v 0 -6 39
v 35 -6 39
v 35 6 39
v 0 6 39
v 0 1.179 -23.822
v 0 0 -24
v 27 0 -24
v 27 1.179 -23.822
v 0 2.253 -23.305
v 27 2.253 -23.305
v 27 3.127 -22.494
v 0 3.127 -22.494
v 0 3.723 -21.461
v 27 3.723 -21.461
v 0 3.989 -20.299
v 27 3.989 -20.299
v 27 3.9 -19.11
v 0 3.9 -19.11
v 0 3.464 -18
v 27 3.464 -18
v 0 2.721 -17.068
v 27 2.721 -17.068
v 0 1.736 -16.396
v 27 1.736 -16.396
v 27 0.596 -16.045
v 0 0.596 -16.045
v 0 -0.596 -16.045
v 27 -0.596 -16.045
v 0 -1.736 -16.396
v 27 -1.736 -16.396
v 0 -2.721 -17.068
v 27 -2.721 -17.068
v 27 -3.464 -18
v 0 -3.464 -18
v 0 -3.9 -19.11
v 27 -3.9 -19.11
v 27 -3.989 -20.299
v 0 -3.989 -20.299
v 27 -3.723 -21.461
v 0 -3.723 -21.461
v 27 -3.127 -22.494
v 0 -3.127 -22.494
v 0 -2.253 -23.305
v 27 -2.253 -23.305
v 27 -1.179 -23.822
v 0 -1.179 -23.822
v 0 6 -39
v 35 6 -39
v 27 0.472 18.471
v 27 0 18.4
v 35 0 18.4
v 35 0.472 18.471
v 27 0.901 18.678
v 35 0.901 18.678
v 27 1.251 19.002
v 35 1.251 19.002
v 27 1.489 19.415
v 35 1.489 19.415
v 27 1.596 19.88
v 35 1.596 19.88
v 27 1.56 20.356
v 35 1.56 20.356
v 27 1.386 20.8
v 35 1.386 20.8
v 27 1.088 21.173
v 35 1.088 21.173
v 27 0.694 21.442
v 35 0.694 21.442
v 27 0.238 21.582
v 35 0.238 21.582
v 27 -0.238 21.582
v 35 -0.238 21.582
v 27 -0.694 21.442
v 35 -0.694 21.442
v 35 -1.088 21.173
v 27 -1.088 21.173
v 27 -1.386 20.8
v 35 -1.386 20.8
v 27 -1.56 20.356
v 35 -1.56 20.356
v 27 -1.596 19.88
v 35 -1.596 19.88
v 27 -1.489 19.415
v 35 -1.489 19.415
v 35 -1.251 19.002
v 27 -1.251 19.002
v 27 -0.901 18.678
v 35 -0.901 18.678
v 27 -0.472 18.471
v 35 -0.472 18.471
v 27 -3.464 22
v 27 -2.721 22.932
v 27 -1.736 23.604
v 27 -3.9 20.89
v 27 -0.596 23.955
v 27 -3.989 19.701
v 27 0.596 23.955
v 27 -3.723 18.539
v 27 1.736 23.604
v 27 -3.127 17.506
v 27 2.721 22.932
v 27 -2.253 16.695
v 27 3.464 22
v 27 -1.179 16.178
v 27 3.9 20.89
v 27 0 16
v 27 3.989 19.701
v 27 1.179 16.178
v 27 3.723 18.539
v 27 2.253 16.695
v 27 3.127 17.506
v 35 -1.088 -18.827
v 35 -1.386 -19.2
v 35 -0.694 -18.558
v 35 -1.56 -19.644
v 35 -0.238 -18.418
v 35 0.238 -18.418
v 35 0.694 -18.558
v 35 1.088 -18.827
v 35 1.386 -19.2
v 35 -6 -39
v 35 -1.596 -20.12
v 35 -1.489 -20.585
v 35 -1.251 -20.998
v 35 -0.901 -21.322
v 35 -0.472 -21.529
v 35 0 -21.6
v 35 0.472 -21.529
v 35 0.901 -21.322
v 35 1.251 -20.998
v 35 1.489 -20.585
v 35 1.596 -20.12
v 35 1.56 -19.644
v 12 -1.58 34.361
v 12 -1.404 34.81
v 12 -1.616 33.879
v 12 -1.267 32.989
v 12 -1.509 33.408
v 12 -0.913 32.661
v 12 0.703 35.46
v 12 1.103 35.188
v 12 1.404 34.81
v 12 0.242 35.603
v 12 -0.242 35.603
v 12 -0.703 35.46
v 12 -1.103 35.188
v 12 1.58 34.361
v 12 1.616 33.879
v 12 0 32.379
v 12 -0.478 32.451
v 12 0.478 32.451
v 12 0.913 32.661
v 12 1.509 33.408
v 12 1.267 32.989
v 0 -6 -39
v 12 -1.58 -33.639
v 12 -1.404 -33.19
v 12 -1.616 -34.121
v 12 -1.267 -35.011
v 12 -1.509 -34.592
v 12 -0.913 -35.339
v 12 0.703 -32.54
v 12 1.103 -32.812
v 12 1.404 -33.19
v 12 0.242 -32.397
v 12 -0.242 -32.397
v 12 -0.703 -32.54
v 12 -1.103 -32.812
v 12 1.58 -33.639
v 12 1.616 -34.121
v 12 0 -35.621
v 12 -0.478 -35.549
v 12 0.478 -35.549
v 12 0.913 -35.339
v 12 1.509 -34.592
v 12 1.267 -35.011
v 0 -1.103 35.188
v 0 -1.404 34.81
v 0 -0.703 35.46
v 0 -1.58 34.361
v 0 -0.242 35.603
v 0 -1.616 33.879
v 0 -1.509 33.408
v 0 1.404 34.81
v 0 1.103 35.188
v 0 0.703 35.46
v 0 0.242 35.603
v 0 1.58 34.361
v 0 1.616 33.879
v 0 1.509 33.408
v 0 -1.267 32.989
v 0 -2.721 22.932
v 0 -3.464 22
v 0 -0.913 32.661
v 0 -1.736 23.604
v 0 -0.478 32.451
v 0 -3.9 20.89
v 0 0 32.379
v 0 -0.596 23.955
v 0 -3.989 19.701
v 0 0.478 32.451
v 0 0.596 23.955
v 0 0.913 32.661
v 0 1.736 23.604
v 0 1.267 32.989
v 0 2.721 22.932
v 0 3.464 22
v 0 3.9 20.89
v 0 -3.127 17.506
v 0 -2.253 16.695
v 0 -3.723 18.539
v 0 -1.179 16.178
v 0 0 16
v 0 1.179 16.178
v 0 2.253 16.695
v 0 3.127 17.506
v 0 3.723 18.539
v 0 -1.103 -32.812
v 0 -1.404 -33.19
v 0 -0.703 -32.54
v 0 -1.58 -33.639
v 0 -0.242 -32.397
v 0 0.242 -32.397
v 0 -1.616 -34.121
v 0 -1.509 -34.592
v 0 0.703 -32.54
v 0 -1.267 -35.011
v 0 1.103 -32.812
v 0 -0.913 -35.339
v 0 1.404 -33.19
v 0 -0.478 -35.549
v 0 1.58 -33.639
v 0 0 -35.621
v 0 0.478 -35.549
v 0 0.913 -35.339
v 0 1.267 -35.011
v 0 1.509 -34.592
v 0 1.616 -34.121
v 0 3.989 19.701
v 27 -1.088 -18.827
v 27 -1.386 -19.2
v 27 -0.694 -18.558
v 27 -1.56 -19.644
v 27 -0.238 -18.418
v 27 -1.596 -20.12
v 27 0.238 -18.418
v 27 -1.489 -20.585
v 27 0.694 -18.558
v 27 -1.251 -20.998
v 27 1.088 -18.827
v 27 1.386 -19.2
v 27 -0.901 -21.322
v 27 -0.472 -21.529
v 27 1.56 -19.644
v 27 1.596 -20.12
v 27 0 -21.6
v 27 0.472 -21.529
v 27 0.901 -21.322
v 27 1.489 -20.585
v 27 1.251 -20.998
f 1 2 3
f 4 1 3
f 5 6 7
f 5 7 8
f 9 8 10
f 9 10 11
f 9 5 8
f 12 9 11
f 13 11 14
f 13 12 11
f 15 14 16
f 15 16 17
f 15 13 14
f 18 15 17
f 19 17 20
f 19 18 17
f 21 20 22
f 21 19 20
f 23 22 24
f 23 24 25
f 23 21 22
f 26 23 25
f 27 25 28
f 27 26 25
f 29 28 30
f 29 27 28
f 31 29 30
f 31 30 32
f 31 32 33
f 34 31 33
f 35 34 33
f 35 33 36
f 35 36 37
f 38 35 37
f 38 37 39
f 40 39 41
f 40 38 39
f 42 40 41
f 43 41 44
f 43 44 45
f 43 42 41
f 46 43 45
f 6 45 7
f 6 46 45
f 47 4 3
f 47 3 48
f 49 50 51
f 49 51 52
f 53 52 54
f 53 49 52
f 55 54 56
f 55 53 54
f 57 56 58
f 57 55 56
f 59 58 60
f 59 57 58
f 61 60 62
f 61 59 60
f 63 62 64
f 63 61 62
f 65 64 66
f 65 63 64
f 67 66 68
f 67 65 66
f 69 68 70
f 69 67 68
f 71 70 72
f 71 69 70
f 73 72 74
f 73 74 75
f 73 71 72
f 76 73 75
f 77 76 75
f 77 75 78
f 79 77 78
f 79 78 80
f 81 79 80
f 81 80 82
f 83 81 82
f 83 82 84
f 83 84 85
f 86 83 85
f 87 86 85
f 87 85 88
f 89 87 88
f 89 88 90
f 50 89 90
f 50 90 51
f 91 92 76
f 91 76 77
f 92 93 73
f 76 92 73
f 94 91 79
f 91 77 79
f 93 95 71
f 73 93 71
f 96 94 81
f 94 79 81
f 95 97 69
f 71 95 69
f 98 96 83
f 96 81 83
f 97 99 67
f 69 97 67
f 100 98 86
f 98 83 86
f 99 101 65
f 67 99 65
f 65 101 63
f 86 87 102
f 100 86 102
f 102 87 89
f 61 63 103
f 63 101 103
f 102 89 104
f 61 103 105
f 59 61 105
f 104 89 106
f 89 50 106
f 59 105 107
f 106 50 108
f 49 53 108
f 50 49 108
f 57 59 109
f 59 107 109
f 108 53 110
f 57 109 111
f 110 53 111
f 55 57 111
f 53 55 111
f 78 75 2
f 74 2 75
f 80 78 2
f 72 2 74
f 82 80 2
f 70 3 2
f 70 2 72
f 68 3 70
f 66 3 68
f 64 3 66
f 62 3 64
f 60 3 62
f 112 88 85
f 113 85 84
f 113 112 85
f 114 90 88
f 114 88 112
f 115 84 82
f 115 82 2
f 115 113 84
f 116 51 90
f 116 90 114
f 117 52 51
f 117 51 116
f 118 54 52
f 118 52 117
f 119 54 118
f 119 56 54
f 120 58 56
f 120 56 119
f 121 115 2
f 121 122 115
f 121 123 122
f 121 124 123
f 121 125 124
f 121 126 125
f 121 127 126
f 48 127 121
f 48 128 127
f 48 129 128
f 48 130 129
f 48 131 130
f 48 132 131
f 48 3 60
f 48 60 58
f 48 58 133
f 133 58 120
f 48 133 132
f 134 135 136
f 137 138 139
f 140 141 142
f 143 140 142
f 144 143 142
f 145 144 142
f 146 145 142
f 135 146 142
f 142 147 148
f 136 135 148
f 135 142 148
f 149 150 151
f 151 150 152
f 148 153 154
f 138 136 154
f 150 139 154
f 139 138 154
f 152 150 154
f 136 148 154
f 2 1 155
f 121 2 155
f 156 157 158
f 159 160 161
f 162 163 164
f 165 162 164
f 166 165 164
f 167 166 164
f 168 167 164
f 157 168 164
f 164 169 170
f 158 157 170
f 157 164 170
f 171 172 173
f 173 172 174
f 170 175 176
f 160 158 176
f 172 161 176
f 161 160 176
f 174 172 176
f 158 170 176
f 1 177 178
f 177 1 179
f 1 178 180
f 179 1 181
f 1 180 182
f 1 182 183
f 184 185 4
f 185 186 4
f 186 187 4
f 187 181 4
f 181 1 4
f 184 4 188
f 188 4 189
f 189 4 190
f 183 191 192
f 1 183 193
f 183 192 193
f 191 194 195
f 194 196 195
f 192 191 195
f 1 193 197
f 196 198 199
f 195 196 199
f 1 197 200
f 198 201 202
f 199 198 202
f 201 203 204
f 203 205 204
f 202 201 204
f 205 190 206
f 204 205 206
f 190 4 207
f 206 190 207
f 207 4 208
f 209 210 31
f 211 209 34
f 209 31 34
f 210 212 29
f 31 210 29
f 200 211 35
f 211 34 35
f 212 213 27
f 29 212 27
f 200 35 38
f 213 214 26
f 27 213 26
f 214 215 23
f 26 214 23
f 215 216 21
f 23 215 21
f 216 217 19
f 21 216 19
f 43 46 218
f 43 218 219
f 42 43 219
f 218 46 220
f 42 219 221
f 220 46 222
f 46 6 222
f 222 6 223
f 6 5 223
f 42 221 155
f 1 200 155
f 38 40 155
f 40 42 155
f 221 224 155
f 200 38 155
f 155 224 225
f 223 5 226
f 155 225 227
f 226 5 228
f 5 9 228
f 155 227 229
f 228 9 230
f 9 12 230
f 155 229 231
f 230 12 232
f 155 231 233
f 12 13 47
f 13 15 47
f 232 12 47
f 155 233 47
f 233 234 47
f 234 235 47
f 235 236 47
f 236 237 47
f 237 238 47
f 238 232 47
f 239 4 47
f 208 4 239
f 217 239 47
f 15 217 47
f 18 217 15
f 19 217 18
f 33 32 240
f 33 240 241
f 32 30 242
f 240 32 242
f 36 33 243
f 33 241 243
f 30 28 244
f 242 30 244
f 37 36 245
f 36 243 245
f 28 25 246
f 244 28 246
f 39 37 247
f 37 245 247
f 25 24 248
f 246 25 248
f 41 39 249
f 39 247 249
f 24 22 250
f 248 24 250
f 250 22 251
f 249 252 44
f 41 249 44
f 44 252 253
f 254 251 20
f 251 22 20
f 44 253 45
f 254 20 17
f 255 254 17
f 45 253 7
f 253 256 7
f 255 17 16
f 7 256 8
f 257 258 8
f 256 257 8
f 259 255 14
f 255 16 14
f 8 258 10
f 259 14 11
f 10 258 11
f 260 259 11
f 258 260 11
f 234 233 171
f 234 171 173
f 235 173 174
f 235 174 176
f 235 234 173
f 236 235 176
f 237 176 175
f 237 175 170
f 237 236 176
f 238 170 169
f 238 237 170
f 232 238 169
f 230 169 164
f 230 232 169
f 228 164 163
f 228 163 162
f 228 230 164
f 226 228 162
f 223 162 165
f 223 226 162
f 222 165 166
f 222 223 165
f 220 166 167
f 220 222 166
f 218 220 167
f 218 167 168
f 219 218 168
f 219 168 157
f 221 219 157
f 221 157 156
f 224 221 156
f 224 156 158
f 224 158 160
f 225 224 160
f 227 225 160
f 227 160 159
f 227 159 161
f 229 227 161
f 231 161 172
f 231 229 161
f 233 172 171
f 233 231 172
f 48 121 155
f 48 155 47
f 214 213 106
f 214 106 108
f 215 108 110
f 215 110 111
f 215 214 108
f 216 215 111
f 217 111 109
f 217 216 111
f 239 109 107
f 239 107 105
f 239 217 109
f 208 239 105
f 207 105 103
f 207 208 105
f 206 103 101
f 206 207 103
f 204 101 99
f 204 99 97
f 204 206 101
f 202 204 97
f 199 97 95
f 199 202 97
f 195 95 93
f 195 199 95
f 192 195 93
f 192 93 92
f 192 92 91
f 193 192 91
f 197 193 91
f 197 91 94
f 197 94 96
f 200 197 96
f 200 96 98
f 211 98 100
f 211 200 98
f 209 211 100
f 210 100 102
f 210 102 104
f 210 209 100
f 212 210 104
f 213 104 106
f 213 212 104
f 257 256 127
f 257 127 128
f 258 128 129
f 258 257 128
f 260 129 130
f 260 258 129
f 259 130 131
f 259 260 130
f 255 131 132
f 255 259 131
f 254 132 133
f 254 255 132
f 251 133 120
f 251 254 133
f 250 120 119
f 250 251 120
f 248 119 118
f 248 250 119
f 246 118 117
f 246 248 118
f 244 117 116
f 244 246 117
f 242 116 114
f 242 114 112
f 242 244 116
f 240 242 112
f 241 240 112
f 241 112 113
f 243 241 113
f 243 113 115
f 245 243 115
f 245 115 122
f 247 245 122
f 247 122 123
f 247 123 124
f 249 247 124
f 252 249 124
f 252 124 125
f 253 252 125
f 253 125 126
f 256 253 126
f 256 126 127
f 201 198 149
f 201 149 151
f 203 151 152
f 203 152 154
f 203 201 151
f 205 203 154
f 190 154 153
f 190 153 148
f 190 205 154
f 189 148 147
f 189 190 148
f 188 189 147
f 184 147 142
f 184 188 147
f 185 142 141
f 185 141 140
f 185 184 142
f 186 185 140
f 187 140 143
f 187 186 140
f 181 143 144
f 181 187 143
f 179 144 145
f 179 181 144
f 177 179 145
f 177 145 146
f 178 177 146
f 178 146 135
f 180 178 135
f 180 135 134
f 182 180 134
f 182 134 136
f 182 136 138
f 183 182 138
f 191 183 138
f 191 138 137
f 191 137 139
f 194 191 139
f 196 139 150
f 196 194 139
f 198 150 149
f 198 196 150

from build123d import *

# Parameters (mm, degrees)
SKETCH1_W           = 78
SKETCH1_H           = 12
BOSS_EXTRUDE1_DEPTH = 35
SKETCH1_4_R         = 4
CUT_EXTRUDE1_DEPTH  = 27
SKETCH1_5_R         = 1.6
CUT_EXTRUDE2_DEPTH  = 35
SKETCH1_6_R         = 1.621
CUT_EXTRUDE3_DEPTH  = 12


with BuildPart() as part:
    # Sketch1 → Boss-Extrude1 (new body)
    with BuildSketch(Plane(origin=(0, 0, 0), x_dir=(0, 0, -1), z_dir=(1, 0, 0))):
        Rectangle(SKETCH1_W, SKETCH1_H)
    extrude(amount=BOSS_EXTRUDE1_DEPTH)

    # Sketch1<4> → Cut-Extrude1 (cut)
    with BuildSketch(Plane(origin=(0, 0, 0), x_dir=(0, 0, -1), z_dir=(1, 0, 0))):
        with Locations((-20, 0)):
            Circle(SKETCH1_4_R)
        with Locations((20, 0)):
            Circle(SKETCH1_4_R)
    extrude(amount=CUT_EXTRUDE1_DEPTH, mode=Mode.SUBTRACT)

    # Sketch1<5> → Cut-Extrude2 (cut)
    with BuildSketch(Plane(origin=(0, 0, 0), x_dir=(0, 0, -1), z_dir=(1, 0, 0))):
        with Locations((-20, 0)):
            Circle(SKETCH1_5_R)
        with Locations((20, 0)):
            Circle(SKETCH1_5_R)
    extrude(amount=CUT_EXTRUDE2_DEPTH, mode=Mode.SUBTRACT)

    # Sketch1<6> → Cut-Extrude3 (cut)
    with BuildSketch(Plane(origin=(0, 0, 0), x_dir=(0, 0, -1), z_dir=(1, 0, 0))):
        with Locations((-34, 0)):
            Circle(SKETCH1_6_R)
        with Locations((34, 0)):
            Circle(SKETCH1_6_R)
    extrude(amount=CUT_EXTRUDE3_DEPTH, mode=Mode.SUBTRACT)


solid = part.part
